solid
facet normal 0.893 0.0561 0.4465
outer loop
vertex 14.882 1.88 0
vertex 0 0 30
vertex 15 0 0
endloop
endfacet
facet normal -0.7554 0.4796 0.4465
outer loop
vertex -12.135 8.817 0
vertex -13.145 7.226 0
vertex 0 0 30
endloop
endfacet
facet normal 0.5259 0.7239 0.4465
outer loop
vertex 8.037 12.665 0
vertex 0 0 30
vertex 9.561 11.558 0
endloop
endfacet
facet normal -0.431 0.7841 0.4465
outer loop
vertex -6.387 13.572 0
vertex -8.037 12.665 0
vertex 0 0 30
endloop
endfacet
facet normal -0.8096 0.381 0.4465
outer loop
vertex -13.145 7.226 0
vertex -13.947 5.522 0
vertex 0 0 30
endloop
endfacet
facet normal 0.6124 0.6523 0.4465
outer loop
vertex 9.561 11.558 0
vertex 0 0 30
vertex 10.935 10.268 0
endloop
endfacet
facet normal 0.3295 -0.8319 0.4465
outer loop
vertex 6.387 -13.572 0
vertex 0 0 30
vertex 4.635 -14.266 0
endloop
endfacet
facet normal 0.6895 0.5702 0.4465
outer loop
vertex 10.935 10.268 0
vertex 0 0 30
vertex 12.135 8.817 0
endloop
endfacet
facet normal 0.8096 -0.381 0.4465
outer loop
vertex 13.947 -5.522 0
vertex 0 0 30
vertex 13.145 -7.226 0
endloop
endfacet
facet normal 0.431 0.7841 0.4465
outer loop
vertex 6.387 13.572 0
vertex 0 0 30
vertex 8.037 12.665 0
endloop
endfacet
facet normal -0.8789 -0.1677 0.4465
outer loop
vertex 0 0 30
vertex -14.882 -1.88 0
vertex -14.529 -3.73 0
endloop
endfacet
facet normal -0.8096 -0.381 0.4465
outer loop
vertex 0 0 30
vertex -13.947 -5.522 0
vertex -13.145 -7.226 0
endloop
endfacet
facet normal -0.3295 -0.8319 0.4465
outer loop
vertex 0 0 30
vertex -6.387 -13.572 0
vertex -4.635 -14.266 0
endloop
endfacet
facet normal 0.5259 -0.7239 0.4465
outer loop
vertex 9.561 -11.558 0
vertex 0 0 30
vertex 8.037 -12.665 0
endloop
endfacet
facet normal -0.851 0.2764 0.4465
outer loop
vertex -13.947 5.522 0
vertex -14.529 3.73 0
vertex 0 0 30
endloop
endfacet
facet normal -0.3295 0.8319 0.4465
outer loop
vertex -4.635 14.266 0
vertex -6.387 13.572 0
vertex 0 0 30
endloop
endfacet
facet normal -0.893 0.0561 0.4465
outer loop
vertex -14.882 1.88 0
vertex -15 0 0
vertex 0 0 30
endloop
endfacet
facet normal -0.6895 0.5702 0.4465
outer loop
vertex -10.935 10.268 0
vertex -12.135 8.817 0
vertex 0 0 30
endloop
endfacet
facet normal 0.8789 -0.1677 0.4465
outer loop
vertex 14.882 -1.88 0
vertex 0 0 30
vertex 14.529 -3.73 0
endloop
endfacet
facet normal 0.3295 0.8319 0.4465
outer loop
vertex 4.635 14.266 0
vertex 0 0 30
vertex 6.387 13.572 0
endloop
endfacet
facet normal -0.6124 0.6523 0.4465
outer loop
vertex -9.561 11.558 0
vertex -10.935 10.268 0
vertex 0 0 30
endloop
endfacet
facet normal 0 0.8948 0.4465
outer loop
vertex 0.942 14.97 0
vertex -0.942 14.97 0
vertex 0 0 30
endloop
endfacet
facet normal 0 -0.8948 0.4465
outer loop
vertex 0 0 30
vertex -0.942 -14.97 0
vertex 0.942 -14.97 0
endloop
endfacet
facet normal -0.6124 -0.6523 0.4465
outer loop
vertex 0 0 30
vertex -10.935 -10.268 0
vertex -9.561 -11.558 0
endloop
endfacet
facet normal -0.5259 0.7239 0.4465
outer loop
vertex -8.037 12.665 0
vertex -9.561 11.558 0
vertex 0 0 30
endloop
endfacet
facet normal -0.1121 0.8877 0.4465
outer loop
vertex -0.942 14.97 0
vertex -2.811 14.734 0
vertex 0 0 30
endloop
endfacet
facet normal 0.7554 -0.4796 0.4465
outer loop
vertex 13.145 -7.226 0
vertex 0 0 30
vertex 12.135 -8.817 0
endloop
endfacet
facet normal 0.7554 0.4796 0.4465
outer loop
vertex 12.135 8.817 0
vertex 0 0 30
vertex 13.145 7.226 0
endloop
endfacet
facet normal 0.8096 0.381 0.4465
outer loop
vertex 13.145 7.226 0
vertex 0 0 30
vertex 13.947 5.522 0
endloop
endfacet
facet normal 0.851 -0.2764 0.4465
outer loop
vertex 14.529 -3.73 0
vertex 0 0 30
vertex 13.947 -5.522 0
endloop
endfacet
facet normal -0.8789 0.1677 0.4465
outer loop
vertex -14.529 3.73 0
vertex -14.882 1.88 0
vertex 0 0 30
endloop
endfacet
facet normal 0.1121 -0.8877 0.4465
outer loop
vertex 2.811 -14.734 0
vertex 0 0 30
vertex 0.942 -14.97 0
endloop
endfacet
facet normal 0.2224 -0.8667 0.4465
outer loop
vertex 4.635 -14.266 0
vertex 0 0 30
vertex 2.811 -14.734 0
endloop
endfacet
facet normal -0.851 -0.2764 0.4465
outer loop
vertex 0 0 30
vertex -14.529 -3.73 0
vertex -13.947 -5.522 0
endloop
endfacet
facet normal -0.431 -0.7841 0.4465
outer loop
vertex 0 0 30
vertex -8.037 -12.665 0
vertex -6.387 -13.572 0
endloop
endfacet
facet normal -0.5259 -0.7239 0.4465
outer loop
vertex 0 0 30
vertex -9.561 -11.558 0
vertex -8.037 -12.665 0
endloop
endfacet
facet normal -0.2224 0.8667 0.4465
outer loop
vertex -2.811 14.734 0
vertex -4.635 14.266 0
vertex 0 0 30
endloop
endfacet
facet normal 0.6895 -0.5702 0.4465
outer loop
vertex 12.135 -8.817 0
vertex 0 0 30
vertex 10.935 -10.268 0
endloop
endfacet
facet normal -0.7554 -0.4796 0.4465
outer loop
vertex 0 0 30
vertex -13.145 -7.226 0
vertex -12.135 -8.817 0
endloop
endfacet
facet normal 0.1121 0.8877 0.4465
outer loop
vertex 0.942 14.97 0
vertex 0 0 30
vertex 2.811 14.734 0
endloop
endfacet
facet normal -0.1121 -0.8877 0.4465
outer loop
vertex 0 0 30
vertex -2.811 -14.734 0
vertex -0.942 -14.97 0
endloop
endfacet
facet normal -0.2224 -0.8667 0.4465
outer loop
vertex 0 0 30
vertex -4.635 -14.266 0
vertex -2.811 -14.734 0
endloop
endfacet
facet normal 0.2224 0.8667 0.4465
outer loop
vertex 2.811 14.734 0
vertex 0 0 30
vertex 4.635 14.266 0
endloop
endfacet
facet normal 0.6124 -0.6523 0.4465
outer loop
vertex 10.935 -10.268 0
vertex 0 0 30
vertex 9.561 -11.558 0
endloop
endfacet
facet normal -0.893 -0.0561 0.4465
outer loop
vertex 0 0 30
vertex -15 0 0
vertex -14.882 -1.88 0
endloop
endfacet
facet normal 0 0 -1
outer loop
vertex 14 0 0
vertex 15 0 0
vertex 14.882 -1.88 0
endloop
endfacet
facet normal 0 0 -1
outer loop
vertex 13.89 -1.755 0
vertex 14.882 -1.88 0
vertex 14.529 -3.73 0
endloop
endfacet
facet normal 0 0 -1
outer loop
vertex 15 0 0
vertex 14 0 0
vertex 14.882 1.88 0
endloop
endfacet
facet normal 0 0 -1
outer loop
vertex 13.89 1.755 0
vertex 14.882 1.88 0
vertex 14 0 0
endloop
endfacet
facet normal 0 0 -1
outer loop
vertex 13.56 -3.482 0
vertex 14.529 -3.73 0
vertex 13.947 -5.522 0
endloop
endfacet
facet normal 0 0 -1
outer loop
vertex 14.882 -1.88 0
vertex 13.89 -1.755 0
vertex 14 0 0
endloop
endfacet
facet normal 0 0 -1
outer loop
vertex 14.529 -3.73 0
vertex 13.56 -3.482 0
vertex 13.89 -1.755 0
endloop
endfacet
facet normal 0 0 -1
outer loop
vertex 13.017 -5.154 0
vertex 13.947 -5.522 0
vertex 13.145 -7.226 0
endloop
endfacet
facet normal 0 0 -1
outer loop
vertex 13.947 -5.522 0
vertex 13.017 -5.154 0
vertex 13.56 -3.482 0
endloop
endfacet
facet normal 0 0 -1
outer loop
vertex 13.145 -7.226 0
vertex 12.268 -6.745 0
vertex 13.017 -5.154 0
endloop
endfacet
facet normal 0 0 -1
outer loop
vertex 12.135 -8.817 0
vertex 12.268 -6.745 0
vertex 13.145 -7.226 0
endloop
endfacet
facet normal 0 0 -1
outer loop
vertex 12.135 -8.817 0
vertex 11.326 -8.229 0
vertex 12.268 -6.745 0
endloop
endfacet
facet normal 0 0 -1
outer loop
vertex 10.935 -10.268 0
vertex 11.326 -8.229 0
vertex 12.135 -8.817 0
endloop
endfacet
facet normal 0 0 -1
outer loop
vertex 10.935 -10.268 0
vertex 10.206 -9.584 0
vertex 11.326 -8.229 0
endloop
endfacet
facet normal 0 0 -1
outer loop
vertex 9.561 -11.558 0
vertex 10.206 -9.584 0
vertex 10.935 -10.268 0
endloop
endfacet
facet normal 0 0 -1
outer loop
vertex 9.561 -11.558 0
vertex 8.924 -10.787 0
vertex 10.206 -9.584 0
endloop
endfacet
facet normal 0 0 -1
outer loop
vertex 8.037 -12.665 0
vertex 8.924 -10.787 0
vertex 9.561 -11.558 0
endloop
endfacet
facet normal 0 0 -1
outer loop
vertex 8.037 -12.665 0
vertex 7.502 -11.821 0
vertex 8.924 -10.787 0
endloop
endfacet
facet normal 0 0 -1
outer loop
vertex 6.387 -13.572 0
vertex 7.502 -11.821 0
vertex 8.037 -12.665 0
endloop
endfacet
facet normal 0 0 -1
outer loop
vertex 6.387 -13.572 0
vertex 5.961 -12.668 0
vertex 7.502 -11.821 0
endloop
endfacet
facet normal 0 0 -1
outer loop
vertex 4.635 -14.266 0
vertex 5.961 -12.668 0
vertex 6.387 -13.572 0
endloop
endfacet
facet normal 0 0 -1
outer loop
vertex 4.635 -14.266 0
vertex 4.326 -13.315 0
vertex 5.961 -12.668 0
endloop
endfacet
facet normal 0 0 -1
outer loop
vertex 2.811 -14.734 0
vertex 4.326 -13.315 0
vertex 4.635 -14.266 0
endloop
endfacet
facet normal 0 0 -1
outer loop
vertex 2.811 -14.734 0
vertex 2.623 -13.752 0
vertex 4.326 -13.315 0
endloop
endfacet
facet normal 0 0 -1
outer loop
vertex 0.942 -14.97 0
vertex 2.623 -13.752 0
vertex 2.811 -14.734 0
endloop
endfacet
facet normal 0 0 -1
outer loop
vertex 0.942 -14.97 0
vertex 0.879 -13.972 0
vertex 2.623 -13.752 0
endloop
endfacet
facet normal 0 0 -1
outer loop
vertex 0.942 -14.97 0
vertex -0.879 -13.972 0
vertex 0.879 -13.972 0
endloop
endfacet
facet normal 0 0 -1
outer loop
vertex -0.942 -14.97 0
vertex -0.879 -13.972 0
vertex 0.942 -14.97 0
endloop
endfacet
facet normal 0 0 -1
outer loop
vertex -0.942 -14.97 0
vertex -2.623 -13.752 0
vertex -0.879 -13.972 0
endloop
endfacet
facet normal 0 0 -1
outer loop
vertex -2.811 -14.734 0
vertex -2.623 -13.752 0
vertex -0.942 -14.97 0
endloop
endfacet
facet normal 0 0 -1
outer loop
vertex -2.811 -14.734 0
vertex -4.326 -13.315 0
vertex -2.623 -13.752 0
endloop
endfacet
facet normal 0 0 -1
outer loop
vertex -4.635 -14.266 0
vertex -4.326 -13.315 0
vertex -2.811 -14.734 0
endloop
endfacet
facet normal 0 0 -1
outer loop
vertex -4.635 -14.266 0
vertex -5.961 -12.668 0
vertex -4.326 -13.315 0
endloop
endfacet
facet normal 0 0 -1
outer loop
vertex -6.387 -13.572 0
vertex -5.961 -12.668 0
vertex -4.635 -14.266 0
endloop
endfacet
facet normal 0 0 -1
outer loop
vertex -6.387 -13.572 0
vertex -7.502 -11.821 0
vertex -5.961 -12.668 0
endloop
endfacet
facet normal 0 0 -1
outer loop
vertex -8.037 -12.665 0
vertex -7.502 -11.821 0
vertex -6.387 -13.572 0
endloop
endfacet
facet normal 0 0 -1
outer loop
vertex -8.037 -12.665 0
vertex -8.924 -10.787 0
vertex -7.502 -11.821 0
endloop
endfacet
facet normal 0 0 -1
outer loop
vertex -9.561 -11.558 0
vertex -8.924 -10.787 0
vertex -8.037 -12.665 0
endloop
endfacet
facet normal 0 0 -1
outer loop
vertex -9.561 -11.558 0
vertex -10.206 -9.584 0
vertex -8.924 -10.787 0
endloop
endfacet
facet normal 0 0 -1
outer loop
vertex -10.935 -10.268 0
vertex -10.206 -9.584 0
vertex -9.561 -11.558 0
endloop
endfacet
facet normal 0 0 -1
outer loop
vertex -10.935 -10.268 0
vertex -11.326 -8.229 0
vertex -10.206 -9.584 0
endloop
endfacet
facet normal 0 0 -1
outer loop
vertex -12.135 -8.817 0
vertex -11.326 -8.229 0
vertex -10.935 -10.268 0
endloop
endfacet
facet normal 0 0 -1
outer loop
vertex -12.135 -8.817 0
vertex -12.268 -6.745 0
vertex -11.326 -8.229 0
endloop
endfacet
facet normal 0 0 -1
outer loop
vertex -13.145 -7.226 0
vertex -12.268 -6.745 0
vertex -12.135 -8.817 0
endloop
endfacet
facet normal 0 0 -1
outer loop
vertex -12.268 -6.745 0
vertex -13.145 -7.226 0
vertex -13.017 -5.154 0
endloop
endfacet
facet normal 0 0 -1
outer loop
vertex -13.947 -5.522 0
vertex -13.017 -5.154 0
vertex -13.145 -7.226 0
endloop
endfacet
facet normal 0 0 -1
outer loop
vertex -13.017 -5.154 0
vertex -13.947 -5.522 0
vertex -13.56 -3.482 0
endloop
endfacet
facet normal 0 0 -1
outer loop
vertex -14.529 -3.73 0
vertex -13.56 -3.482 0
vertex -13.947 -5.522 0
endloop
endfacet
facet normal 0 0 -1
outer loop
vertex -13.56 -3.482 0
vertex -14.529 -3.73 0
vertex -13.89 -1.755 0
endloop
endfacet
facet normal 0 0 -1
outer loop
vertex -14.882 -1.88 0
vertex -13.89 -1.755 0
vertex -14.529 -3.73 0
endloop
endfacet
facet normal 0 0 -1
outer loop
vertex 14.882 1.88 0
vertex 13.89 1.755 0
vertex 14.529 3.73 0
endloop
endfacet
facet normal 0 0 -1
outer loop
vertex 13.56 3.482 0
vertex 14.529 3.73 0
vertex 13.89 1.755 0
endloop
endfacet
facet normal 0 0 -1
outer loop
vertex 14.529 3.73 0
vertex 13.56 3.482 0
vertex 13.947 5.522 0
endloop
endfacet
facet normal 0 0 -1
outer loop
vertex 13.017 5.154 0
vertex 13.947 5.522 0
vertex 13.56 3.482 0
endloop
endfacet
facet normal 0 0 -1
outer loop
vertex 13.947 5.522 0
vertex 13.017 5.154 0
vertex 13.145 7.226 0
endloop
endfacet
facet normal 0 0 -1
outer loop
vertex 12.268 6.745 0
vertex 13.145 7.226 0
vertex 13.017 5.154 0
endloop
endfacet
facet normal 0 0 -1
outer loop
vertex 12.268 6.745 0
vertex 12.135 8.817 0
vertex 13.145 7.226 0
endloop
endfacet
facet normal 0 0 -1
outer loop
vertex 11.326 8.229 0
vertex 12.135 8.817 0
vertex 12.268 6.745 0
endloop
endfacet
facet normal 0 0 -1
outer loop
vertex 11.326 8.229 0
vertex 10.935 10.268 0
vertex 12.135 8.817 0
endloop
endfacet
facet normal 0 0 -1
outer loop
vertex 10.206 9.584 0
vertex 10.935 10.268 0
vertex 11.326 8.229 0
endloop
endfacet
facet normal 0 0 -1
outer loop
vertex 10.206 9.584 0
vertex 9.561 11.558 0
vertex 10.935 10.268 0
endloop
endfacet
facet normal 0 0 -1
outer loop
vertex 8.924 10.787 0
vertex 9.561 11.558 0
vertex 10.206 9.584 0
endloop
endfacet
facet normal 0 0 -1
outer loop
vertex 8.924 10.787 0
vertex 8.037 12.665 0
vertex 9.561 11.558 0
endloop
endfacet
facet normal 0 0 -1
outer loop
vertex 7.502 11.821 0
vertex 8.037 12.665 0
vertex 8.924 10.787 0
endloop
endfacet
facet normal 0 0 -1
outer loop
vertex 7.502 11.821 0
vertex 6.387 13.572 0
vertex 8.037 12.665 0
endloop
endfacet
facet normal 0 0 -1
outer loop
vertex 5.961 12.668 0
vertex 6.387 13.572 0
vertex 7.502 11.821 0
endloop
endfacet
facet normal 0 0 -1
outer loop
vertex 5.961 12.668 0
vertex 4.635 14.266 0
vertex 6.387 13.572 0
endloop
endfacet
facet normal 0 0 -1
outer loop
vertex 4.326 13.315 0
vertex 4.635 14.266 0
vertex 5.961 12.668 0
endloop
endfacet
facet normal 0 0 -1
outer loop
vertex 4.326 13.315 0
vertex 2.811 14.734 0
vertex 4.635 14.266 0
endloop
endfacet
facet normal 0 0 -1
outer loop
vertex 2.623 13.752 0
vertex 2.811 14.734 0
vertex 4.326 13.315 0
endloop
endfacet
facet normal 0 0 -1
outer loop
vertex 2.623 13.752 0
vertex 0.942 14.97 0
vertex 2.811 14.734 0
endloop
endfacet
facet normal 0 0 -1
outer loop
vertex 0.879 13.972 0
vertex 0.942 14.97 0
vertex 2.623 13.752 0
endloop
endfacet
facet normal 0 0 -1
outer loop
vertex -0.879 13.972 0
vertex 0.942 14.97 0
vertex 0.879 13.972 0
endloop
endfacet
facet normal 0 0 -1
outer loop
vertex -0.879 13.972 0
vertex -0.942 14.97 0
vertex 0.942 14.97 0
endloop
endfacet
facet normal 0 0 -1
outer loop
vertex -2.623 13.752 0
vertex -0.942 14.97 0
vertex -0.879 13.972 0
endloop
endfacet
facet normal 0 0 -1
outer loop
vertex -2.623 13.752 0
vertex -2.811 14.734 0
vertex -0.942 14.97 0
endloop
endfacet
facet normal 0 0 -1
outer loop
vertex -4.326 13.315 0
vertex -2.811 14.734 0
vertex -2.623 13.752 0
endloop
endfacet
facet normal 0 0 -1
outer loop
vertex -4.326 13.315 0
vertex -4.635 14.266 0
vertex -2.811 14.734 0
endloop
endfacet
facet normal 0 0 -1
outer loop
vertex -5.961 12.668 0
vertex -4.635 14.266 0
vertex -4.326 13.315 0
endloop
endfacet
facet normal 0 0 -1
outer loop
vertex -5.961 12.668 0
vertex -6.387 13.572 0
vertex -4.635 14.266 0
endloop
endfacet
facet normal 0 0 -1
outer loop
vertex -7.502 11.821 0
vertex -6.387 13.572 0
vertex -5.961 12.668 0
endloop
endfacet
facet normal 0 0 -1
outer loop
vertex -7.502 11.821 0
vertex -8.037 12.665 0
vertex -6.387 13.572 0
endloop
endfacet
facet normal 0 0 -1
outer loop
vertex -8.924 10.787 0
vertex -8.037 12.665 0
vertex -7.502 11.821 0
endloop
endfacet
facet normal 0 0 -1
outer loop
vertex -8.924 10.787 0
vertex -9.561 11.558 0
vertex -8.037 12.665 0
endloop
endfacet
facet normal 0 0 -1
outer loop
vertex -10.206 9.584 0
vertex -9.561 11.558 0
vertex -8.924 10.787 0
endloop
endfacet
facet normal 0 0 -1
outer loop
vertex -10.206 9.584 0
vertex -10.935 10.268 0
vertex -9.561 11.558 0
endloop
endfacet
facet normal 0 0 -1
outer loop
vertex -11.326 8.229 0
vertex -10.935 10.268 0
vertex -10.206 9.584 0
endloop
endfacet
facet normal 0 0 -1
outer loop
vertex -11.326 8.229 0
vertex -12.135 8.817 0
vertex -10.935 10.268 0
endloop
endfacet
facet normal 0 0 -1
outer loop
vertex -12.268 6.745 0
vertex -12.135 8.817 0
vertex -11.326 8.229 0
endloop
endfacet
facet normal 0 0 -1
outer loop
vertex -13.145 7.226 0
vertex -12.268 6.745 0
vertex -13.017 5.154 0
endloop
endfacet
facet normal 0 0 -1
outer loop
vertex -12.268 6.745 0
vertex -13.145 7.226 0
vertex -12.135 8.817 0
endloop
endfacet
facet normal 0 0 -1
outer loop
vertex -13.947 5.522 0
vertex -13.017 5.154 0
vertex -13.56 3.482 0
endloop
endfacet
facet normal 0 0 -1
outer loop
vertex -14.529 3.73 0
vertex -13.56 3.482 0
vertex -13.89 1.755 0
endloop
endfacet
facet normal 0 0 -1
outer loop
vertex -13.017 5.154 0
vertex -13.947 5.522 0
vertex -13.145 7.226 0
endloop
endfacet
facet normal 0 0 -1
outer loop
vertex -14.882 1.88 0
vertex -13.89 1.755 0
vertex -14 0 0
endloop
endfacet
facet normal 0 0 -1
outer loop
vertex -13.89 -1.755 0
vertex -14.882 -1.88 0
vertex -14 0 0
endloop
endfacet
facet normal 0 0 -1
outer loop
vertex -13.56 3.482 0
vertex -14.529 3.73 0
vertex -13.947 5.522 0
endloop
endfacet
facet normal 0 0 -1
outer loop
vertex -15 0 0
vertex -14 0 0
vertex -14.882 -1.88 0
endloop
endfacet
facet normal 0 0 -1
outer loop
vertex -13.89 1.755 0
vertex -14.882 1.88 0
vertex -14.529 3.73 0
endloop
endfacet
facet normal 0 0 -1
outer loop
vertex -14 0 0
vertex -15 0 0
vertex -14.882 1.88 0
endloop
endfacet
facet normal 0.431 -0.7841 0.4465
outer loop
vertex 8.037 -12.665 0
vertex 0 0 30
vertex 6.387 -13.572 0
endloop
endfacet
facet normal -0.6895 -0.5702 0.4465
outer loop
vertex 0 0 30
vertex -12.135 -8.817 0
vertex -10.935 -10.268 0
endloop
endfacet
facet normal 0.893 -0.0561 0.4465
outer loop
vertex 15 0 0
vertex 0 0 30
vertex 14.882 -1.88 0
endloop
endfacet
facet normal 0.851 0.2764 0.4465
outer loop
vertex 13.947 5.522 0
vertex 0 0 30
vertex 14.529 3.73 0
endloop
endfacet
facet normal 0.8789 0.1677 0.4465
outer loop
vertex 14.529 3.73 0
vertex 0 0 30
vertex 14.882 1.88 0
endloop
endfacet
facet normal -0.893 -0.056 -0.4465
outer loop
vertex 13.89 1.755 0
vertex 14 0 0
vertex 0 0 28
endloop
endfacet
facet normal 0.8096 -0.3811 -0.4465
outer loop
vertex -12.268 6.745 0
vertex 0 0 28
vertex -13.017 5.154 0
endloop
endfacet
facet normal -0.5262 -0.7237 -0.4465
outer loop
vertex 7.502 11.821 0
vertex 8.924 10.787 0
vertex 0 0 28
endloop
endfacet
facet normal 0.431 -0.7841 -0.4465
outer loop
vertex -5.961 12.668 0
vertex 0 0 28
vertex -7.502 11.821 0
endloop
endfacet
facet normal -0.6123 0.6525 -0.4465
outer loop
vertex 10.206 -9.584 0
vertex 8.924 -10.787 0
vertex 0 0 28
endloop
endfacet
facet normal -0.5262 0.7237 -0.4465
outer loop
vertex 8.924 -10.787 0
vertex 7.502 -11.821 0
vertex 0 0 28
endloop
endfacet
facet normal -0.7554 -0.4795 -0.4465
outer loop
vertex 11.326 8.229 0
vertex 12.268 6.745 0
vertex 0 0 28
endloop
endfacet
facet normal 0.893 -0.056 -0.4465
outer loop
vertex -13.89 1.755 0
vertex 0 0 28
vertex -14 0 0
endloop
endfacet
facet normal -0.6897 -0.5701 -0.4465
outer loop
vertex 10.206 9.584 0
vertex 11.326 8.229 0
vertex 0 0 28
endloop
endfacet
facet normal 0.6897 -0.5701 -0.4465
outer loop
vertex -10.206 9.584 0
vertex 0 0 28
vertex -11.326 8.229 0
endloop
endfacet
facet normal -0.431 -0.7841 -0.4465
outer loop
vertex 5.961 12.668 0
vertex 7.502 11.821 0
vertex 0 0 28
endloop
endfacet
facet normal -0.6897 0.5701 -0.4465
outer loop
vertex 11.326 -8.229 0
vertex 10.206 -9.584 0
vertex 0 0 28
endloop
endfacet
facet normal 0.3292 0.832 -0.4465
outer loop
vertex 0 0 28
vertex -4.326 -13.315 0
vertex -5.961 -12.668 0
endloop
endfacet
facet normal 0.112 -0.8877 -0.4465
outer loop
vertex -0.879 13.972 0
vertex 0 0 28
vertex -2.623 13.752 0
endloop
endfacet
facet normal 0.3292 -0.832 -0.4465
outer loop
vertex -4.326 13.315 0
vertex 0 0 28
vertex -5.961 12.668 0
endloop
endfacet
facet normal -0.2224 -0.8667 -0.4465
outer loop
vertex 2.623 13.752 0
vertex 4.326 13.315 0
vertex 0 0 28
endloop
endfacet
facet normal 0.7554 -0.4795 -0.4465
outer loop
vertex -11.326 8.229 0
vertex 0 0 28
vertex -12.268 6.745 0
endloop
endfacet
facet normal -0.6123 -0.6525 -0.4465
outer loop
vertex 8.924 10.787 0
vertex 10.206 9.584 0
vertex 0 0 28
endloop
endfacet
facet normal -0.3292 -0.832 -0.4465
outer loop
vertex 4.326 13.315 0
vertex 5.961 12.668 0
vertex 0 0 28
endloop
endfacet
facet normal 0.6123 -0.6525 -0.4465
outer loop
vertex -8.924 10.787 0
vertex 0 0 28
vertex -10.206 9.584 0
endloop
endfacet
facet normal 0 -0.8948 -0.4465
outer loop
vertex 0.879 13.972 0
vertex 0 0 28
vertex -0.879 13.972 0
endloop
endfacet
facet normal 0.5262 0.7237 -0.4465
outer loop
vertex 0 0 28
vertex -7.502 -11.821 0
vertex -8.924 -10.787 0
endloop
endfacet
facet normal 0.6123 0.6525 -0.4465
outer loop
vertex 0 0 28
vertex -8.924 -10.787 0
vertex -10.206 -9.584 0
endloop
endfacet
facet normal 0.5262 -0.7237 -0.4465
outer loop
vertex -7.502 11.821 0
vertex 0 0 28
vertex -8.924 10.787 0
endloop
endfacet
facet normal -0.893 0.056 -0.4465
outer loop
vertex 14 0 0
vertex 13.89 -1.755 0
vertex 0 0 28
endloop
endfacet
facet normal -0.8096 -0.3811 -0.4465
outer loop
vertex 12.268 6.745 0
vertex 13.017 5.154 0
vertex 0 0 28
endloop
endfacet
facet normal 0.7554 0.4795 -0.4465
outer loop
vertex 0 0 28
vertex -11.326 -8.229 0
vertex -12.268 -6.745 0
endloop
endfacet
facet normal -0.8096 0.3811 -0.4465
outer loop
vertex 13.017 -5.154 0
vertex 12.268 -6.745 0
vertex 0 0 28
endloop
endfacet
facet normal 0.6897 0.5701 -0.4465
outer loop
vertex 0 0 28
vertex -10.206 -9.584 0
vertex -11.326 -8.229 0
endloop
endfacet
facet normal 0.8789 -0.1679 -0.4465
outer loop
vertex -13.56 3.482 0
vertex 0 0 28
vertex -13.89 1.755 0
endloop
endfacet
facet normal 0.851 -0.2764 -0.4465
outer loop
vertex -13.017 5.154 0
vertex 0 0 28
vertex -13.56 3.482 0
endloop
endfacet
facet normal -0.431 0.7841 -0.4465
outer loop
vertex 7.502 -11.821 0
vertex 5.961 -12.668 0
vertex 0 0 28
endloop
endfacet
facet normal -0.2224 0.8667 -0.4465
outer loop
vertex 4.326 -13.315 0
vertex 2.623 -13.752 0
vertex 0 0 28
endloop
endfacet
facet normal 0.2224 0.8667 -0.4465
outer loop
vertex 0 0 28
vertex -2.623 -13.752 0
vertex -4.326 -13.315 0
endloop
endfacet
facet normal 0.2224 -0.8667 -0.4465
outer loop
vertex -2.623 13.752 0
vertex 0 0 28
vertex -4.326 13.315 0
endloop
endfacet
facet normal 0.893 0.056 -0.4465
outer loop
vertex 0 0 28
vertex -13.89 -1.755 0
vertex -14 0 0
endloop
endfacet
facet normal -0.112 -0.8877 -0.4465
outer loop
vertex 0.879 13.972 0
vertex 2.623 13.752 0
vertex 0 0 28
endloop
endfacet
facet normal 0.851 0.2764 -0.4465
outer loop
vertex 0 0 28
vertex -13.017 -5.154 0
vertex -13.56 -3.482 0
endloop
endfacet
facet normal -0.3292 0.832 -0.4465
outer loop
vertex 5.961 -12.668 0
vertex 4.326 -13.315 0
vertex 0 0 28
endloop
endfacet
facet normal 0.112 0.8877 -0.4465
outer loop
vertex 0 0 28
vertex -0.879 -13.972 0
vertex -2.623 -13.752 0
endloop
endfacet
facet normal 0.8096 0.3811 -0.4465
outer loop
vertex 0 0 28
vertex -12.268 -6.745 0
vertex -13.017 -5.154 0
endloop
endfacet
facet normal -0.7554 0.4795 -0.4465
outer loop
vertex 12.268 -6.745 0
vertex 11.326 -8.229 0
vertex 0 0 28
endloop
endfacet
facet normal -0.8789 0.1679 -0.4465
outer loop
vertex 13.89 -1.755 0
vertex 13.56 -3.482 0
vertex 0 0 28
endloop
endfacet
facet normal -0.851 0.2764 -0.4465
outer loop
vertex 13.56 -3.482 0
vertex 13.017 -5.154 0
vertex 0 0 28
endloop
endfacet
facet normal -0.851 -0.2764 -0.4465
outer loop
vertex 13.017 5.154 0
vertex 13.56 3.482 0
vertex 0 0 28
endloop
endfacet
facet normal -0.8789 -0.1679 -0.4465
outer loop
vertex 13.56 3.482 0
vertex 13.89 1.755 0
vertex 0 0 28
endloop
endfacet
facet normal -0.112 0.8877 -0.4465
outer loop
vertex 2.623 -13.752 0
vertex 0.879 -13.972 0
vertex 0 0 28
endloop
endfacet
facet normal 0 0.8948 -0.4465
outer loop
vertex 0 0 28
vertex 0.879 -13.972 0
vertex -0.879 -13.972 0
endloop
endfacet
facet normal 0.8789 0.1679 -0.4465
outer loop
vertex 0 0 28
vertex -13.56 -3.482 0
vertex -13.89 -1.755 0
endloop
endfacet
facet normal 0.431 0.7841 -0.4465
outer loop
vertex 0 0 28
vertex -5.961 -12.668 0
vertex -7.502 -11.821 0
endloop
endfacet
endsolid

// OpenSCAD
// cone height
conus_height = 30;
// cone diameter
conus_diameter = 30;
// cone thickness
conus_thickness = 2;
// cone fn (>=3)
conus_fn = 50;

conus2_height = conus_height-conus_thickness;
conus2_diameter = conus_diameter-conus_thickness;

difference(){
  cylinder(h=conus_height, d1=conus_diameter, d2=0, $fn=conus_fn);
  cylinder(h=conus2_height, d1=conus2_diameter, d2=0, $fn=conus_fn);
}
